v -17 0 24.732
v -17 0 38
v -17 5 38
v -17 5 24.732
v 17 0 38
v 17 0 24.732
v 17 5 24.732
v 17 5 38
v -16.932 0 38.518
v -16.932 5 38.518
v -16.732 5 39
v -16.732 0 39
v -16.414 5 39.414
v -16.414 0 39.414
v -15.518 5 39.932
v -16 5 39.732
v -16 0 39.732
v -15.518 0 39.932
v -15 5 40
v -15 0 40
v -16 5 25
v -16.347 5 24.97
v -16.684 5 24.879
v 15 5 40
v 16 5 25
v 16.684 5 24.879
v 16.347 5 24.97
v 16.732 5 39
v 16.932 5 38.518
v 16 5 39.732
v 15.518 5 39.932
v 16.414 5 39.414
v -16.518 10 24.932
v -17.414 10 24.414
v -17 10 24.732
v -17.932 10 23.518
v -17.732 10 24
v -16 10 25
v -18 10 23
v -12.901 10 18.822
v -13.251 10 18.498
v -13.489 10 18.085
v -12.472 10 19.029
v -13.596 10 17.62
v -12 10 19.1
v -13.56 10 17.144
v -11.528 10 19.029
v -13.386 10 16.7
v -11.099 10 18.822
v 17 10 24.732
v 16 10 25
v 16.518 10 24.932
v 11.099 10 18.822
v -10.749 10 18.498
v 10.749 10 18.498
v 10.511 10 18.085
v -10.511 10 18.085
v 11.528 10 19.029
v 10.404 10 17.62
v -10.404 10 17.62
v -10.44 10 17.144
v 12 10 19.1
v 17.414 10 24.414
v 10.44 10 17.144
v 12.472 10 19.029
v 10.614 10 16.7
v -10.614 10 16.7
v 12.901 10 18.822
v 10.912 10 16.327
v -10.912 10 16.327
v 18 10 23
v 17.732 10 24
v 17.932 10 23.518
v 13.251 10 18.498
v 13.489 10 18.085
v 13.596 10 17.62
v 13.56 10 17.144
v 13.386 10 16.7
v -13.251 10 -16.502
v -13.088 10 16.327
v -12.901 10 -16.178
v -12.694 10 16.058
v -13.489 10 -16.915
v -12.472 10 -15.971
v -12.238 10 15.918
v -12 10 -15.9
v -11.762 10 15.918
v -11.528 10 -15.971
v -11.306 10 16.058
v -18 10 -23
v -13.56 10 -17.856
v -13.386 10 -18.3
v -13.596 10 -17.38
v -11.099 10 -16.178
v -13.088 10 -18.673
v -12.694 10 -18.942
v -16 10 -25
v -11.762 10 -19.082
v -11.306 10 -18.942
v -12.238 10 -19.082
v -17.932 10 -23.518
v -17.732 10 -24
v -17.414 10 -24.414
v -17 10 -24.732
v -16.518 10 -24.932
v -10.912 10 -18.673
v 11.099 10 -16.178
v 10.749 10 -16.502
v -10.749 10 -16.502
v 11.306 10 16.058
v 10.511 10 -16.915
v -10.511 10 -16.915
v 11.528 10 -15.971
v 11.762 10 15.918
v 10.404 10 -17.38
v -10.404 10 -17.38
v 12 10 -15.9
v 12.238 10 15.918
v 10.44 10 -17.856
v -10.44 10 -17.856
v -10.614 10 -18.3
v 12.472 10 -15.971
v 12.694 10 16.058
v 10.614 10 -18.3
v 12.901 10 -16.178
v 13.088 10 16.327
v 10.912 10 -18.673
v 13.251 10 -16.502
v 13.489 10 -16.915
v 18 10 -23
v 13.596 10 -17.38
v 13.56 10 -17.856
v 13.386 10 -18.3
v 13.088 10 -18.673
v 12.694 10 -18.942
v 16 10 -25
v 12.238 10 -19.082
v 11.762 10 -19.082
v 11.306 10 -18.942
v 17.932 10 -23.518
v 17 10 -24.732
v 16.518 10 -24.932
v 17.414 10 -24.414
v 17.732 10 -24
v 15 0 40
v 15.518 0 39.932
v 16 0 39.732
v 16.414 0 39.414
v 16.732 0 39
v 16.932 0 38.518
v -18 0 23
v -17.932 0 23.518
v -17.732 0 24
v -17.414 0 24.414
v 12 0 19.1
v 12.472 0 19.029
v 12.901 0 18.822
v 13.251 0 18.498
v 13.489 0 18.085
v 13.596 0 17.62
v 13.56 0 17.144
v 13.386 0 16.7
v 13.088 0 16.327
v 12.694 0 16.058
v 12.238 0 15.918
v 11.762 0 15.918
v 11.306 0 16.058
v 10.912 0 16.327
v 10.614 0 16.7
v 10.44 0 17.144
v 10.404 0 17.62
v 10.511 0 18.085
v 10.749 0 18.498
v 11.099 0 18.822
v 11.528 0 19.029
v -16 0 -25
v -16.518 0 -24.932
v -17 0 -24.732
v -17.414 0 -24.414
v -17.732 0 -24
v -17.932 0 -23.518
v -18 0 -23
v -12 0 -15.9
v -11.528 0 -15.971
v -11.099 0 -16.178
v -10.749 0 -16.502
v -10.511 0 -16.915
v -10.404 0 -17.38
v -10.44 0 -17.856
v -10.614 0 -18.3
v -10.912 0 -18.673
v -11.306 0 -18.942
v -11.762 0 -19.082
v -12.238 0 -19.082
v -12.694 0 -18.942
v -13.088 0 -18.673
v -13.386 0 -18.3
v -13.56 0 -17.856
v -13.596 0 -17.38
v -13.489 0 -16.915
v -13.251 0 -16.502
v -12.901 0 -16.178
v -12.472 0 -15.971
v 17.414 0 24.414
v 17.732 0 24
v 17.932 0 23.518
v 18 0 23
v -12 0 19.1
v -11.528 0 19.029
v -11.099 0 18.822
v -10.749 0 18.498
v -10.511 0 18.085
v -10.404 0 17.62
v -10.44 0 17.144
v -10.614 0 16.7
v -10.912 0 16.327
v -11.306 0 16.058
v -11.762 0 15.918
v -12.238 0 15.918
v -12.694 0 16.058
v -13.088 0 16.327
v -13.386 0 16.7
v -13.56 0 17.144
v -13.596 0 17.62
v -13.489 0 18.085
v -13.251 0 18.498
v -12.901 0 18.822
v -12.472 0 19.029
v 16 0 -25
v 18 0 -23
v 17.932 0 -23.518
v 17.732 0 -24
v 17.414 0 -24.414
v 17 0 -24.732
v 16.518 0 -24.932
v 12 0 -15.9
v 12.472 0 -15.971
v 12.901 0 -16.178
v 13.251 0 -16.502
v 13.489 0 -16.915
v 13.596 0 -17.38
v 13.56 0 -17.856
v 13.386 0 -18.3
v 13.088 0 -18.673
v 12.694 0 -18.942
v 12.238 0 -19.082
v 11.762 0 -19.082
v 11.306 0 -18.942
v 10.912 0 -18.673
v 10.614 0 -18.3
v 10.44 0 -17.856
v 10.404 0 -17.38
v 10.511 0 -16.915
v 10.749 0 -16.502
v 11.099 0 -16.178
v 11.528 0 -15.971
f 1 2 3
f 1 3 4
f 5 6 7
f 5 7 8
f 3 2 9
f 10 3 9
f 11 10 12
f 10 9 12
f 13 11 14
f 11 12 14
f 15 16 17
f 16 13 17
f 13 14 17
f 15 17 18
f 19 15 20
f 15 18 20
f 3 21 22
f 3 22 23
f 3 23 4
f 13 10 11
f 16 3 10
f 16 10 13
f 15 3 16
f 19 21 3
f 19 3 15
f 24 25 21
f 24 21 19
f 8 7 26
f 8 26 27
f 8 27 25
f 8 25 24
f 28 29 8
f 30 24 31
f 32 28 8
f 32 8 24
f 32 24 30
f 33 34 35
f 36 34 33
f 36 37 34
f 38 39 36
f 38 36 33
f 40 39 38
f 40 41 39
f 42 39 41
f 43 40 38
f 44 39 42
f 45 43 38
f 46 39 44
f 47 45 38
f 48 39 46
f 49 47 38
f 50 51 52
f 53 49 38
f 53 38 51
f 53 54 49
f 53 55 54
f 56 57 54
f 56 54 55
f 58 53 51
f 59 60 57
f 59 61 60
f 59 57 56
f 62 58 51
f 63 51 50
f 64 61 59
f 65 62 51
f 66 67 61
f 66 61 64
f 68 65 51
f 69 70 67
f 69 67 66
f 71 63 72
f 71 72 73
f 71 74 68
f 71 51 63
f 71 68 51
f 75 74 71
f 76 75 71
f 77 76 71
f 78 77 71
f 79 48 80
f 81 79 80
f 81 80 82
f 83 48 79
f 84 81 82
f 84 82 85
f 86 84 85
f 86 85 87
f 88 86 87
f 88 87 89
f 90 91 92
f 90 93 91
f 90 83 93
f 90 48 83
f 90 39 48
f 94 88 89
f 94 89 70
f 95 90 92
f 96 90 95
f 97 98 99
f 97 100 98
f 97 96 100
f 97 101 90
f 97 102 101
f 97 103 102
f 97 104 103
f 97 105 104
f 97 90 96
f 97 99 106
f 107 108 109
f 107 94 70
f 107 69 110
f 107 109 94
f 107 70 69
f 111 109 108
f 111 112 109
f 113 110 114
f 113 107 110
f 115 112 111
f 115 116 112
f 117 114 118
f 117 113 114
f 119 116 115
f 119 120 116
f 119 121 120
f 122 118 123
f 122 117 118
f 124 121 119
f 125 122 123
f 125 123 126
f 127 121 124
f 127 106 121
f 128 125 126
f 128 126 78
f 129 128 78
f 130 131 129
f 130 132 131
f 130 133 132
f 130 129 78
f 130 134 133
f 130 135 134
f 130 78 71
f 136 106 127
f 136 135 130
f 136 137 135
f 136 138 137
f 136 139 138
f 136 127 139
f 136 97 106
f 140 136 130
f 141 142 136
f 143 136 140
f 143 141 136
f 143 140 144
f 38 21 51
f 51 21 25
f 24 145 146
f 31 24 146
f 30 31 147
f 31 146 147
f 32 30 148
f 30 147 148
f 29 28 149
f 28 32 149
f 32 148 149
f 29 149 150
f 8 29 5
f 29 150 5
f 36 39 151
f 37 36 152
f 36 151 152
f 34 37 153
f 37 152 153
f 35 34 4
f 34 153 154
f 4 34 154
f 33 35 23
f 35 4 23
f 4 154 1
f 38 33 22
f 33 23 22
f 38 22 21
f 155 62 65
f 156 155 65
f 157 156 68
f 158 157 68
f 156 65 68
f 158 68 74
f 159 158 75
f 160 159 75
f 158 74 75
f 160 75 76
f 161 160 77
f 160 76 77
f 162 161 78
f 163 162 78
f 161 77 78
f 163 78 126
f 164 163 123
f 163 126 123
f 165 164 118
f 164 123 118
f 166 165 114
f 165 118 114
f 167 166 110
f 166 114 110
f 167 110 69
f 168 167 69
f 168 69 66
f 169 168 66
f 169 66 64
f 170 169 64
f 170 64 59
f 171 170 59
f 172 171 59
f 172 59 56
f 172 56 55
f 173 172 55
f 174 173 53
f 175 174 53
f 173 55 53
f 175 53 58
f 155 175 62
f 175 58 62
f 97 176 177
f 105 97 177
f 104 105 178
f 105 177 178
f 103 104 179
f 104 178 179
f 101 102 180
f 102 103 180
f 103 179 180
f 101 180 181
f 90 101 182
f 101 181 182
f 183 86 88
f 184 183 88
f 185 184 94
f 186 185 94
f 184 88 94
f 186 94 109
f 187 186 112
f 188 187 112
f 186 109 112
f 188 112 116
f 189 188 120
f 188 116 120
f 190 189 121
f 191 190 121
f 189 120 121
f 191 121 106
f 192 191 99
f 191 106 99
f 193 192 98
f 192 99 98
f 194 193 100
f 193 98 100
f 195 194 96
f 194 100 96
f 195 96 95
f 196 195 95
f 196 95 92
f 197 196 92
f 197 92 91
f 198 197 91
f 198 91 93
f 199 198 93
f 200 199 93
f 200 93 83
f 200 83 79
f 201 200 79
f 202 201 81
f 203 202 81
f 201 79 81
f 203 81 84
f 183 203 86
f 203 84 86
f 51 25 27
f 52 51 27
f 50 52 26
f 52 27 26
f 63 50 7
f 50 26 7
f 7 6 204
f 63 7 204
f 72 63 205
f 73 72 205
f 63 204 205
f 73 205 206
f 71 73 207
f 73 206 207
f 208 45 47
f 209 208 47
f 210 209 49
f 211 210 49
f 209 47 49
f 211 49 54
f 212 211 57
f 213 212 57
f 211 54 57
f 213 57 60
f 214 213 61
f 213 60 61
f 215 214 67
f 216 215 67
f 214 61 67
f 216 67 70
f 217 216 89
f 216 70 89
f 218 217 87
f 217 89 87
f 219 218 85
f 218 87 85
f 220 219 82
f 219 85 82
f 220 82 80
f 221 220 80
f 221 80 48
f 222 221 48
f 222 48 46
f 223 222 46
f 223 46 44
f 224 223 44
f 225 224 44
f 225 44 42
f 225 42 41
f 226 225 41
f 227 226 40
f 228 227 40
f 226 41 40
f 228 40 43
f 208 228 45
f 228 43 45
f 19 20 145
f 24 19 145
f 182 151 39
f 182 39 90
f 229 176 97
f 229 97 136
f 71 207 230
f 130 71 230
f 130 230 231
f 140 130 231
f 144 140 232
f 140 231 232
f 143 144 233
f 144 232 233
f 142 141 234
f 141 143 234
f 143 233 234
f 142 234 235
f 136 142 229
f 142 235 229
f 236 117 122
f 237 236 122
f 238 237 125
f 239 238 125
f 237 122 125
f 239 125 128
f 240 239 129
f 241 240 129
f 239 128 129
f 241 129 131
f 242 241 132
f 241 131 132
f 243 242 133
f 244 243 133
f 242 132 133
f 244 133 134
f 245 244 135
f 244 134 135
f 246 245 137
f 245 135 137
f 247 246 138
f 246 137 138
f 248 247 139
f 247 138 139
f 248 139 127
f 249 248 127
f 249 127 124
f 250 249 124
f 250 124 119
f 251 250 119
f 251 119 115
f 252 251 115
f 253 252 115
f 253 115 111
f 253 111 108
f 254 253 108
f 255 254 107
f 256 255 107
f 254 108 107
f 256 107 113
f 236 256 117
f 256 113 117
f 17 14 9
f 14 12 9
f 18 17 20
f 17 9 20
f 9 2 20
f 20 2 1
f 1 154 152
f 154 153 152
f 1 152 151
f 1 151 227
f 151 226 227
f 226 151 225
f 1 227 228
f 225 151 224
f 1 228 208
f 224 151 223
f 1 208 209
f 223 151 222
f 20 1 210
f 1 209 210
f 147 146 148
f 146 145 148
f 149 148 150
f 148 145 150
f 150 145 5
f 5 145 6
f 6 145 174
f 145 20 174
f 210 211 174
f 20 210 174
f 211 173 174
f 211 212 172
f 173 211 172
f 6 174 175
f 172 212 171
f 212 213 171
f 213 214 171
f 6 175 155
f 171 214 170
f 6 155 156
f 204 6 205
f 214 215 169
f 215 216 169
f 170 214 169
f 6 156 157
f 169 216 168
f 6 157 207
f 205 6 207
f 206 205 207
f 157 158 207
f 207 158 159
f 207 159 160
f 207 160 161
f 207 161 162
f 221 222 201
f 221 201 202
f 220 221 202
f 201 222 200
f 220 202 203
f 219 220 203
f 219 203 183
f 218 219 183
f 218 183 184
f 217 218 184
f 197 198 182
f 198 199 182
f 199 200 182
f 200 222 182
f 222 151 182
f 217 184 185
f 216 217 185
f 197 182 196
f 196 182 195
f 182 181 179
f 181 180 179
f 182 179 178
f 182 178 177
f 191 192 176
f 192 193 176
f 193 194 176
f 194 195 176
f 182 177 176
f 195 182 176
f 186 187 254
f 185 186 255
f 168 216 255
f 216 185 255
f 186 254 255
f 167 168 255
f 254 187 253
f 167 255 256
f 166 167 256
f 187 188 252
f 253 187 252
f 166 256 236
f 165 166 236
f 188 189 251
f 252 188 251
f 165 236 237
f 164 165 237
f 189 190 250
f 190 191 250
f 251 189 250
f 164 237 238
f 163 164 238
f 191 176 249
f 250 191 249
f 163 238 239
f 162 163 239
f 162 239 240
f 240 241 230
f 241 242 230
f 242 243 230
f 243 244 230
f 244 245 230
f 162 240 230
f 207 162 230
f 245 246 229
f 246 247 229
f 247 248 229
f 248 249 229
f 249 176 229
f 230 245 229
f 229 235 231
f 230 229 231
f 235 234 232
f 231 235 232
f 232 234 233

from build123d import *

# Parameters (mm, degrees)
SKETCH_1_W          = 36
SKETCH_1_H          = 50
SKETCH_1_W_2        = 34
SKETCH_1_H_2        = 15
EXTRUDE_1_DEPTH     = 10
SKETCH_2_R          = 1.6
CUT_EXTRUDE_1_DEPTH = 10
SKETCH_3_W          = 34
SKETCH_3_H          = 15
CUT_EXTRUDE_2_DEPTH = 5
FILLET_1_R          = 2


with BuildPart() as part:
    # 草图1 → 凸台-拉伸1 (new body)
    with BuildSketch(Plane(origin=(0, 0, 0), x_dir=(1, 0, 0), z_dir=(0, 1, 0))):
        Rectangle(SKETCH_1_W, SKETCH_1_H)
        with Locations((0, -32.5)):
            Rectangle(SKETCH_1_W_2, SKETCH_1_H_2)
    extrude(amount=EXTRUDE_1_DEPTH)

    # 草图2 → 切除-拉伸1 (cut)
    with BuildSketch(Plane(origin=(0, 10, 0), x_dir=(1, 0, 0), z_dir=(0, 1, 0))):
        with Locations(Location((12, 17.5, 0), (0, 0, 270))):
            Circle(SKETCH_2_R)
        with Locations(Location((-12, 17.5, 0), (0, 0, 270))):
            Circle(SKETCH_2_R)
        with Locations(Location((-12, -17.5, 0), (0, 0, 270))):
            Circle(SKETCH_2_R)
        with Locations(Location((12, -17.5, 0), (0, 0, 270))):
            Circle(SKETCH_2_R)
    extrude(amount=-CUT_EXTRUDE_1_DEPTH, mode=Mode.SUBTRACT)

    # 草图3 → 切除-拉伸2 (cut)
    with BuildSketch(Plane(origin=(0, 10, 0), x_dir=(1, 0, 0), z_dir=(0, 1, 0))):
        with Locations((0, -32.5)):
            Rectangle(SKETCH_3_W, SKETCH_3_H)
    extrude(amount=-CUT_EXTRUDE_2_DEPTH, mode=Mode.SUBTRACT)

    # 圆角1
    # the kernel refuses this fillet: 2 mm, written as the material it takes off along each edge
    with BuildSketch(Plane(origin=(18, -5, -25), x_dir=(0, 0, 1), z_dir=(0, 1, 0))) as fillet_1_piece_1:
        with BuildLine():
            CenterArc((FILLET_1_R, -FILLET_1_R), FILLET_1_R, 90, 90)
            Line((0, -FILLET_1_R), (0, 0))
            Line((0, 0), (FILLET_1_R, 0))
        make_face()
    extrude(amount=20, mode=Mode.SUBTRACT)
    with BuildSketch(Plane(origin=(17, -5, 40), x_dir=(-1, 0, 0), z_dir=(0, 1, 0)), Plane(origin=(-17, -5, 40), x_dir=(0, 0, -1), z_dir=(0, 1, 0))) as fillet_1_piece_2:
        with BuildLine():
            CenterArc((FILLET_1_R, -FILLET_1_R), FILLET_1_R, 90, 90)
            Line((0, -FILLET_1_R), (0, 0))
            Line((0, 0), (FILLET_1_R, 0))
        make_face()
    extrude(amount=15, mode=Mode.SUBTRACT)
    with BuildSketch(Plane(origin=(-18, -5, 25), x_dir=(0, 0, -1), z_dir=(0, 1, 0))) as fillet_1_piece_3_section:
        with BuildLine():
            CenterArc((FILLET_1_R, -FILLET_1_R), FILLET_1_R, 90, 90)
            Line((0, -FILLET_1_R), (0, 0))
            Line((0, 0), (FILLET_1_R, 0))
        make_face()
    fillet_1_piece_3 = extrude(amount=20, mode=Mode.PRIVATE)
    fillet_1_piece_3 = split(fillet_1_piece_3, bisect_by=Plane(origin=(-17, 2.5, 24.511950301), z_dir=(-1, 0, 0)), keep=Keep.TOP, mode=Mode.PRIVATE)
    add(fillet_1_piece_3, mode=Mode.SUBTRACT)
    with BuildSketch(Plane(origin=(-18, -5, 25), x_dir=(0, 0, -1), z_dir=(0, 1, 0))) as fillet_1_piece_4_section:
        with BuildLine():
            CenterArc((FILLET_1_R, -FILLET_1_R), FILLET_1_R, 90, 90)
            Line((0, -FILLET_1_R), (0, 0))
            Line((0, 0), (FILLET_1_R, 0))
        make_face()
    fillet_1_piece_4 = extrude(amount=20, mode=Mode.PRIVATE)
    fillet_1_piece_4 = split(fillet_1_piece_4, bisect_by=Plane(origin=(-16.753472775, 5, 24.920630815), z_dir=(0, 1, 0)), keep=Keep.TOP, mode=Mode.PRIVATE)
    add(fillet_1_piece_4, mode=Mode.SUBTRACT)
    with BuildSketch(Plane(origin=(18, -5, 25), x_dir=(0, 0, -1), z_dir=(0, 1, 0))) as fillet_1_piece_5_section:
        with BuildLine():
            CenterArc((FILLET_1_R, FILLET_1_R), FILLET_1_R, 180, 90)
            Line((0, FILLET_1_R), (0, 0))
            Line((0, 0), (FILLET_1_R, 0))
        make_face()
    fillet_1_piece_5 = extrude(amount=20, mode=Mode.PRIVATE)
    fillet_1_piece_5 = split(fillet_1_piece_5, bisect_by=Plane(origin=(17, 2.5, 24.511950301), z_dir=(1, 0, 0)), keep=Keep.TOP, mode=Mode.PRIVATE)
    add(fillet_1_piece_5, mode=Mode.SUBTRACT)
    with BuildSketch(Plane(origin=(18, -5, 25), x_dir=(0, 0, -1), z_dir=(0, 1, 0))) as fillet_1_piece_6_section:
        with BuildLine():
            CenterArc((FILLET_1_R, FILLET_1_R), FILLET_1_R, 180, 90)
            Line((0, FILLET_1_R), (0, 0))
            Line((0, 0), (FILLET_1_R, 0))
        make_face()
    fillet_1_piece_6 = extrude(amount=20, mode=Mode.PRIVATE)
    fillet_1_piece_6 = split(fillet_1_piece_6, bisect_by=Plane(origin=(16.753472775, 5, 24.920630815), z_dir=(0, 1, 0)), keep=Keep.TOP, mode=Mode.PRIVATE)
    add(fillet_1_piece_6, mode=Mode.SUBTRACT)
    with BuildSketch(Plane(origin=(-18, -5, -25), x_dir=(0, 0, 1), z_dir=(0, 1, 0))) as fillet_1_piece_7:
        with BuildLine():
            CenterArc((FILLET_1_R, FILLET_1_R), FILLET_1_R, 180, 90)
            Line((0, FILLET_1_R), (0, 0))
            Line((0, 0), (FILLET_1_R, 0))
        make_face()
    extrude(amount=20, mode=Mode.SUBTRACT)


solid = part.part
